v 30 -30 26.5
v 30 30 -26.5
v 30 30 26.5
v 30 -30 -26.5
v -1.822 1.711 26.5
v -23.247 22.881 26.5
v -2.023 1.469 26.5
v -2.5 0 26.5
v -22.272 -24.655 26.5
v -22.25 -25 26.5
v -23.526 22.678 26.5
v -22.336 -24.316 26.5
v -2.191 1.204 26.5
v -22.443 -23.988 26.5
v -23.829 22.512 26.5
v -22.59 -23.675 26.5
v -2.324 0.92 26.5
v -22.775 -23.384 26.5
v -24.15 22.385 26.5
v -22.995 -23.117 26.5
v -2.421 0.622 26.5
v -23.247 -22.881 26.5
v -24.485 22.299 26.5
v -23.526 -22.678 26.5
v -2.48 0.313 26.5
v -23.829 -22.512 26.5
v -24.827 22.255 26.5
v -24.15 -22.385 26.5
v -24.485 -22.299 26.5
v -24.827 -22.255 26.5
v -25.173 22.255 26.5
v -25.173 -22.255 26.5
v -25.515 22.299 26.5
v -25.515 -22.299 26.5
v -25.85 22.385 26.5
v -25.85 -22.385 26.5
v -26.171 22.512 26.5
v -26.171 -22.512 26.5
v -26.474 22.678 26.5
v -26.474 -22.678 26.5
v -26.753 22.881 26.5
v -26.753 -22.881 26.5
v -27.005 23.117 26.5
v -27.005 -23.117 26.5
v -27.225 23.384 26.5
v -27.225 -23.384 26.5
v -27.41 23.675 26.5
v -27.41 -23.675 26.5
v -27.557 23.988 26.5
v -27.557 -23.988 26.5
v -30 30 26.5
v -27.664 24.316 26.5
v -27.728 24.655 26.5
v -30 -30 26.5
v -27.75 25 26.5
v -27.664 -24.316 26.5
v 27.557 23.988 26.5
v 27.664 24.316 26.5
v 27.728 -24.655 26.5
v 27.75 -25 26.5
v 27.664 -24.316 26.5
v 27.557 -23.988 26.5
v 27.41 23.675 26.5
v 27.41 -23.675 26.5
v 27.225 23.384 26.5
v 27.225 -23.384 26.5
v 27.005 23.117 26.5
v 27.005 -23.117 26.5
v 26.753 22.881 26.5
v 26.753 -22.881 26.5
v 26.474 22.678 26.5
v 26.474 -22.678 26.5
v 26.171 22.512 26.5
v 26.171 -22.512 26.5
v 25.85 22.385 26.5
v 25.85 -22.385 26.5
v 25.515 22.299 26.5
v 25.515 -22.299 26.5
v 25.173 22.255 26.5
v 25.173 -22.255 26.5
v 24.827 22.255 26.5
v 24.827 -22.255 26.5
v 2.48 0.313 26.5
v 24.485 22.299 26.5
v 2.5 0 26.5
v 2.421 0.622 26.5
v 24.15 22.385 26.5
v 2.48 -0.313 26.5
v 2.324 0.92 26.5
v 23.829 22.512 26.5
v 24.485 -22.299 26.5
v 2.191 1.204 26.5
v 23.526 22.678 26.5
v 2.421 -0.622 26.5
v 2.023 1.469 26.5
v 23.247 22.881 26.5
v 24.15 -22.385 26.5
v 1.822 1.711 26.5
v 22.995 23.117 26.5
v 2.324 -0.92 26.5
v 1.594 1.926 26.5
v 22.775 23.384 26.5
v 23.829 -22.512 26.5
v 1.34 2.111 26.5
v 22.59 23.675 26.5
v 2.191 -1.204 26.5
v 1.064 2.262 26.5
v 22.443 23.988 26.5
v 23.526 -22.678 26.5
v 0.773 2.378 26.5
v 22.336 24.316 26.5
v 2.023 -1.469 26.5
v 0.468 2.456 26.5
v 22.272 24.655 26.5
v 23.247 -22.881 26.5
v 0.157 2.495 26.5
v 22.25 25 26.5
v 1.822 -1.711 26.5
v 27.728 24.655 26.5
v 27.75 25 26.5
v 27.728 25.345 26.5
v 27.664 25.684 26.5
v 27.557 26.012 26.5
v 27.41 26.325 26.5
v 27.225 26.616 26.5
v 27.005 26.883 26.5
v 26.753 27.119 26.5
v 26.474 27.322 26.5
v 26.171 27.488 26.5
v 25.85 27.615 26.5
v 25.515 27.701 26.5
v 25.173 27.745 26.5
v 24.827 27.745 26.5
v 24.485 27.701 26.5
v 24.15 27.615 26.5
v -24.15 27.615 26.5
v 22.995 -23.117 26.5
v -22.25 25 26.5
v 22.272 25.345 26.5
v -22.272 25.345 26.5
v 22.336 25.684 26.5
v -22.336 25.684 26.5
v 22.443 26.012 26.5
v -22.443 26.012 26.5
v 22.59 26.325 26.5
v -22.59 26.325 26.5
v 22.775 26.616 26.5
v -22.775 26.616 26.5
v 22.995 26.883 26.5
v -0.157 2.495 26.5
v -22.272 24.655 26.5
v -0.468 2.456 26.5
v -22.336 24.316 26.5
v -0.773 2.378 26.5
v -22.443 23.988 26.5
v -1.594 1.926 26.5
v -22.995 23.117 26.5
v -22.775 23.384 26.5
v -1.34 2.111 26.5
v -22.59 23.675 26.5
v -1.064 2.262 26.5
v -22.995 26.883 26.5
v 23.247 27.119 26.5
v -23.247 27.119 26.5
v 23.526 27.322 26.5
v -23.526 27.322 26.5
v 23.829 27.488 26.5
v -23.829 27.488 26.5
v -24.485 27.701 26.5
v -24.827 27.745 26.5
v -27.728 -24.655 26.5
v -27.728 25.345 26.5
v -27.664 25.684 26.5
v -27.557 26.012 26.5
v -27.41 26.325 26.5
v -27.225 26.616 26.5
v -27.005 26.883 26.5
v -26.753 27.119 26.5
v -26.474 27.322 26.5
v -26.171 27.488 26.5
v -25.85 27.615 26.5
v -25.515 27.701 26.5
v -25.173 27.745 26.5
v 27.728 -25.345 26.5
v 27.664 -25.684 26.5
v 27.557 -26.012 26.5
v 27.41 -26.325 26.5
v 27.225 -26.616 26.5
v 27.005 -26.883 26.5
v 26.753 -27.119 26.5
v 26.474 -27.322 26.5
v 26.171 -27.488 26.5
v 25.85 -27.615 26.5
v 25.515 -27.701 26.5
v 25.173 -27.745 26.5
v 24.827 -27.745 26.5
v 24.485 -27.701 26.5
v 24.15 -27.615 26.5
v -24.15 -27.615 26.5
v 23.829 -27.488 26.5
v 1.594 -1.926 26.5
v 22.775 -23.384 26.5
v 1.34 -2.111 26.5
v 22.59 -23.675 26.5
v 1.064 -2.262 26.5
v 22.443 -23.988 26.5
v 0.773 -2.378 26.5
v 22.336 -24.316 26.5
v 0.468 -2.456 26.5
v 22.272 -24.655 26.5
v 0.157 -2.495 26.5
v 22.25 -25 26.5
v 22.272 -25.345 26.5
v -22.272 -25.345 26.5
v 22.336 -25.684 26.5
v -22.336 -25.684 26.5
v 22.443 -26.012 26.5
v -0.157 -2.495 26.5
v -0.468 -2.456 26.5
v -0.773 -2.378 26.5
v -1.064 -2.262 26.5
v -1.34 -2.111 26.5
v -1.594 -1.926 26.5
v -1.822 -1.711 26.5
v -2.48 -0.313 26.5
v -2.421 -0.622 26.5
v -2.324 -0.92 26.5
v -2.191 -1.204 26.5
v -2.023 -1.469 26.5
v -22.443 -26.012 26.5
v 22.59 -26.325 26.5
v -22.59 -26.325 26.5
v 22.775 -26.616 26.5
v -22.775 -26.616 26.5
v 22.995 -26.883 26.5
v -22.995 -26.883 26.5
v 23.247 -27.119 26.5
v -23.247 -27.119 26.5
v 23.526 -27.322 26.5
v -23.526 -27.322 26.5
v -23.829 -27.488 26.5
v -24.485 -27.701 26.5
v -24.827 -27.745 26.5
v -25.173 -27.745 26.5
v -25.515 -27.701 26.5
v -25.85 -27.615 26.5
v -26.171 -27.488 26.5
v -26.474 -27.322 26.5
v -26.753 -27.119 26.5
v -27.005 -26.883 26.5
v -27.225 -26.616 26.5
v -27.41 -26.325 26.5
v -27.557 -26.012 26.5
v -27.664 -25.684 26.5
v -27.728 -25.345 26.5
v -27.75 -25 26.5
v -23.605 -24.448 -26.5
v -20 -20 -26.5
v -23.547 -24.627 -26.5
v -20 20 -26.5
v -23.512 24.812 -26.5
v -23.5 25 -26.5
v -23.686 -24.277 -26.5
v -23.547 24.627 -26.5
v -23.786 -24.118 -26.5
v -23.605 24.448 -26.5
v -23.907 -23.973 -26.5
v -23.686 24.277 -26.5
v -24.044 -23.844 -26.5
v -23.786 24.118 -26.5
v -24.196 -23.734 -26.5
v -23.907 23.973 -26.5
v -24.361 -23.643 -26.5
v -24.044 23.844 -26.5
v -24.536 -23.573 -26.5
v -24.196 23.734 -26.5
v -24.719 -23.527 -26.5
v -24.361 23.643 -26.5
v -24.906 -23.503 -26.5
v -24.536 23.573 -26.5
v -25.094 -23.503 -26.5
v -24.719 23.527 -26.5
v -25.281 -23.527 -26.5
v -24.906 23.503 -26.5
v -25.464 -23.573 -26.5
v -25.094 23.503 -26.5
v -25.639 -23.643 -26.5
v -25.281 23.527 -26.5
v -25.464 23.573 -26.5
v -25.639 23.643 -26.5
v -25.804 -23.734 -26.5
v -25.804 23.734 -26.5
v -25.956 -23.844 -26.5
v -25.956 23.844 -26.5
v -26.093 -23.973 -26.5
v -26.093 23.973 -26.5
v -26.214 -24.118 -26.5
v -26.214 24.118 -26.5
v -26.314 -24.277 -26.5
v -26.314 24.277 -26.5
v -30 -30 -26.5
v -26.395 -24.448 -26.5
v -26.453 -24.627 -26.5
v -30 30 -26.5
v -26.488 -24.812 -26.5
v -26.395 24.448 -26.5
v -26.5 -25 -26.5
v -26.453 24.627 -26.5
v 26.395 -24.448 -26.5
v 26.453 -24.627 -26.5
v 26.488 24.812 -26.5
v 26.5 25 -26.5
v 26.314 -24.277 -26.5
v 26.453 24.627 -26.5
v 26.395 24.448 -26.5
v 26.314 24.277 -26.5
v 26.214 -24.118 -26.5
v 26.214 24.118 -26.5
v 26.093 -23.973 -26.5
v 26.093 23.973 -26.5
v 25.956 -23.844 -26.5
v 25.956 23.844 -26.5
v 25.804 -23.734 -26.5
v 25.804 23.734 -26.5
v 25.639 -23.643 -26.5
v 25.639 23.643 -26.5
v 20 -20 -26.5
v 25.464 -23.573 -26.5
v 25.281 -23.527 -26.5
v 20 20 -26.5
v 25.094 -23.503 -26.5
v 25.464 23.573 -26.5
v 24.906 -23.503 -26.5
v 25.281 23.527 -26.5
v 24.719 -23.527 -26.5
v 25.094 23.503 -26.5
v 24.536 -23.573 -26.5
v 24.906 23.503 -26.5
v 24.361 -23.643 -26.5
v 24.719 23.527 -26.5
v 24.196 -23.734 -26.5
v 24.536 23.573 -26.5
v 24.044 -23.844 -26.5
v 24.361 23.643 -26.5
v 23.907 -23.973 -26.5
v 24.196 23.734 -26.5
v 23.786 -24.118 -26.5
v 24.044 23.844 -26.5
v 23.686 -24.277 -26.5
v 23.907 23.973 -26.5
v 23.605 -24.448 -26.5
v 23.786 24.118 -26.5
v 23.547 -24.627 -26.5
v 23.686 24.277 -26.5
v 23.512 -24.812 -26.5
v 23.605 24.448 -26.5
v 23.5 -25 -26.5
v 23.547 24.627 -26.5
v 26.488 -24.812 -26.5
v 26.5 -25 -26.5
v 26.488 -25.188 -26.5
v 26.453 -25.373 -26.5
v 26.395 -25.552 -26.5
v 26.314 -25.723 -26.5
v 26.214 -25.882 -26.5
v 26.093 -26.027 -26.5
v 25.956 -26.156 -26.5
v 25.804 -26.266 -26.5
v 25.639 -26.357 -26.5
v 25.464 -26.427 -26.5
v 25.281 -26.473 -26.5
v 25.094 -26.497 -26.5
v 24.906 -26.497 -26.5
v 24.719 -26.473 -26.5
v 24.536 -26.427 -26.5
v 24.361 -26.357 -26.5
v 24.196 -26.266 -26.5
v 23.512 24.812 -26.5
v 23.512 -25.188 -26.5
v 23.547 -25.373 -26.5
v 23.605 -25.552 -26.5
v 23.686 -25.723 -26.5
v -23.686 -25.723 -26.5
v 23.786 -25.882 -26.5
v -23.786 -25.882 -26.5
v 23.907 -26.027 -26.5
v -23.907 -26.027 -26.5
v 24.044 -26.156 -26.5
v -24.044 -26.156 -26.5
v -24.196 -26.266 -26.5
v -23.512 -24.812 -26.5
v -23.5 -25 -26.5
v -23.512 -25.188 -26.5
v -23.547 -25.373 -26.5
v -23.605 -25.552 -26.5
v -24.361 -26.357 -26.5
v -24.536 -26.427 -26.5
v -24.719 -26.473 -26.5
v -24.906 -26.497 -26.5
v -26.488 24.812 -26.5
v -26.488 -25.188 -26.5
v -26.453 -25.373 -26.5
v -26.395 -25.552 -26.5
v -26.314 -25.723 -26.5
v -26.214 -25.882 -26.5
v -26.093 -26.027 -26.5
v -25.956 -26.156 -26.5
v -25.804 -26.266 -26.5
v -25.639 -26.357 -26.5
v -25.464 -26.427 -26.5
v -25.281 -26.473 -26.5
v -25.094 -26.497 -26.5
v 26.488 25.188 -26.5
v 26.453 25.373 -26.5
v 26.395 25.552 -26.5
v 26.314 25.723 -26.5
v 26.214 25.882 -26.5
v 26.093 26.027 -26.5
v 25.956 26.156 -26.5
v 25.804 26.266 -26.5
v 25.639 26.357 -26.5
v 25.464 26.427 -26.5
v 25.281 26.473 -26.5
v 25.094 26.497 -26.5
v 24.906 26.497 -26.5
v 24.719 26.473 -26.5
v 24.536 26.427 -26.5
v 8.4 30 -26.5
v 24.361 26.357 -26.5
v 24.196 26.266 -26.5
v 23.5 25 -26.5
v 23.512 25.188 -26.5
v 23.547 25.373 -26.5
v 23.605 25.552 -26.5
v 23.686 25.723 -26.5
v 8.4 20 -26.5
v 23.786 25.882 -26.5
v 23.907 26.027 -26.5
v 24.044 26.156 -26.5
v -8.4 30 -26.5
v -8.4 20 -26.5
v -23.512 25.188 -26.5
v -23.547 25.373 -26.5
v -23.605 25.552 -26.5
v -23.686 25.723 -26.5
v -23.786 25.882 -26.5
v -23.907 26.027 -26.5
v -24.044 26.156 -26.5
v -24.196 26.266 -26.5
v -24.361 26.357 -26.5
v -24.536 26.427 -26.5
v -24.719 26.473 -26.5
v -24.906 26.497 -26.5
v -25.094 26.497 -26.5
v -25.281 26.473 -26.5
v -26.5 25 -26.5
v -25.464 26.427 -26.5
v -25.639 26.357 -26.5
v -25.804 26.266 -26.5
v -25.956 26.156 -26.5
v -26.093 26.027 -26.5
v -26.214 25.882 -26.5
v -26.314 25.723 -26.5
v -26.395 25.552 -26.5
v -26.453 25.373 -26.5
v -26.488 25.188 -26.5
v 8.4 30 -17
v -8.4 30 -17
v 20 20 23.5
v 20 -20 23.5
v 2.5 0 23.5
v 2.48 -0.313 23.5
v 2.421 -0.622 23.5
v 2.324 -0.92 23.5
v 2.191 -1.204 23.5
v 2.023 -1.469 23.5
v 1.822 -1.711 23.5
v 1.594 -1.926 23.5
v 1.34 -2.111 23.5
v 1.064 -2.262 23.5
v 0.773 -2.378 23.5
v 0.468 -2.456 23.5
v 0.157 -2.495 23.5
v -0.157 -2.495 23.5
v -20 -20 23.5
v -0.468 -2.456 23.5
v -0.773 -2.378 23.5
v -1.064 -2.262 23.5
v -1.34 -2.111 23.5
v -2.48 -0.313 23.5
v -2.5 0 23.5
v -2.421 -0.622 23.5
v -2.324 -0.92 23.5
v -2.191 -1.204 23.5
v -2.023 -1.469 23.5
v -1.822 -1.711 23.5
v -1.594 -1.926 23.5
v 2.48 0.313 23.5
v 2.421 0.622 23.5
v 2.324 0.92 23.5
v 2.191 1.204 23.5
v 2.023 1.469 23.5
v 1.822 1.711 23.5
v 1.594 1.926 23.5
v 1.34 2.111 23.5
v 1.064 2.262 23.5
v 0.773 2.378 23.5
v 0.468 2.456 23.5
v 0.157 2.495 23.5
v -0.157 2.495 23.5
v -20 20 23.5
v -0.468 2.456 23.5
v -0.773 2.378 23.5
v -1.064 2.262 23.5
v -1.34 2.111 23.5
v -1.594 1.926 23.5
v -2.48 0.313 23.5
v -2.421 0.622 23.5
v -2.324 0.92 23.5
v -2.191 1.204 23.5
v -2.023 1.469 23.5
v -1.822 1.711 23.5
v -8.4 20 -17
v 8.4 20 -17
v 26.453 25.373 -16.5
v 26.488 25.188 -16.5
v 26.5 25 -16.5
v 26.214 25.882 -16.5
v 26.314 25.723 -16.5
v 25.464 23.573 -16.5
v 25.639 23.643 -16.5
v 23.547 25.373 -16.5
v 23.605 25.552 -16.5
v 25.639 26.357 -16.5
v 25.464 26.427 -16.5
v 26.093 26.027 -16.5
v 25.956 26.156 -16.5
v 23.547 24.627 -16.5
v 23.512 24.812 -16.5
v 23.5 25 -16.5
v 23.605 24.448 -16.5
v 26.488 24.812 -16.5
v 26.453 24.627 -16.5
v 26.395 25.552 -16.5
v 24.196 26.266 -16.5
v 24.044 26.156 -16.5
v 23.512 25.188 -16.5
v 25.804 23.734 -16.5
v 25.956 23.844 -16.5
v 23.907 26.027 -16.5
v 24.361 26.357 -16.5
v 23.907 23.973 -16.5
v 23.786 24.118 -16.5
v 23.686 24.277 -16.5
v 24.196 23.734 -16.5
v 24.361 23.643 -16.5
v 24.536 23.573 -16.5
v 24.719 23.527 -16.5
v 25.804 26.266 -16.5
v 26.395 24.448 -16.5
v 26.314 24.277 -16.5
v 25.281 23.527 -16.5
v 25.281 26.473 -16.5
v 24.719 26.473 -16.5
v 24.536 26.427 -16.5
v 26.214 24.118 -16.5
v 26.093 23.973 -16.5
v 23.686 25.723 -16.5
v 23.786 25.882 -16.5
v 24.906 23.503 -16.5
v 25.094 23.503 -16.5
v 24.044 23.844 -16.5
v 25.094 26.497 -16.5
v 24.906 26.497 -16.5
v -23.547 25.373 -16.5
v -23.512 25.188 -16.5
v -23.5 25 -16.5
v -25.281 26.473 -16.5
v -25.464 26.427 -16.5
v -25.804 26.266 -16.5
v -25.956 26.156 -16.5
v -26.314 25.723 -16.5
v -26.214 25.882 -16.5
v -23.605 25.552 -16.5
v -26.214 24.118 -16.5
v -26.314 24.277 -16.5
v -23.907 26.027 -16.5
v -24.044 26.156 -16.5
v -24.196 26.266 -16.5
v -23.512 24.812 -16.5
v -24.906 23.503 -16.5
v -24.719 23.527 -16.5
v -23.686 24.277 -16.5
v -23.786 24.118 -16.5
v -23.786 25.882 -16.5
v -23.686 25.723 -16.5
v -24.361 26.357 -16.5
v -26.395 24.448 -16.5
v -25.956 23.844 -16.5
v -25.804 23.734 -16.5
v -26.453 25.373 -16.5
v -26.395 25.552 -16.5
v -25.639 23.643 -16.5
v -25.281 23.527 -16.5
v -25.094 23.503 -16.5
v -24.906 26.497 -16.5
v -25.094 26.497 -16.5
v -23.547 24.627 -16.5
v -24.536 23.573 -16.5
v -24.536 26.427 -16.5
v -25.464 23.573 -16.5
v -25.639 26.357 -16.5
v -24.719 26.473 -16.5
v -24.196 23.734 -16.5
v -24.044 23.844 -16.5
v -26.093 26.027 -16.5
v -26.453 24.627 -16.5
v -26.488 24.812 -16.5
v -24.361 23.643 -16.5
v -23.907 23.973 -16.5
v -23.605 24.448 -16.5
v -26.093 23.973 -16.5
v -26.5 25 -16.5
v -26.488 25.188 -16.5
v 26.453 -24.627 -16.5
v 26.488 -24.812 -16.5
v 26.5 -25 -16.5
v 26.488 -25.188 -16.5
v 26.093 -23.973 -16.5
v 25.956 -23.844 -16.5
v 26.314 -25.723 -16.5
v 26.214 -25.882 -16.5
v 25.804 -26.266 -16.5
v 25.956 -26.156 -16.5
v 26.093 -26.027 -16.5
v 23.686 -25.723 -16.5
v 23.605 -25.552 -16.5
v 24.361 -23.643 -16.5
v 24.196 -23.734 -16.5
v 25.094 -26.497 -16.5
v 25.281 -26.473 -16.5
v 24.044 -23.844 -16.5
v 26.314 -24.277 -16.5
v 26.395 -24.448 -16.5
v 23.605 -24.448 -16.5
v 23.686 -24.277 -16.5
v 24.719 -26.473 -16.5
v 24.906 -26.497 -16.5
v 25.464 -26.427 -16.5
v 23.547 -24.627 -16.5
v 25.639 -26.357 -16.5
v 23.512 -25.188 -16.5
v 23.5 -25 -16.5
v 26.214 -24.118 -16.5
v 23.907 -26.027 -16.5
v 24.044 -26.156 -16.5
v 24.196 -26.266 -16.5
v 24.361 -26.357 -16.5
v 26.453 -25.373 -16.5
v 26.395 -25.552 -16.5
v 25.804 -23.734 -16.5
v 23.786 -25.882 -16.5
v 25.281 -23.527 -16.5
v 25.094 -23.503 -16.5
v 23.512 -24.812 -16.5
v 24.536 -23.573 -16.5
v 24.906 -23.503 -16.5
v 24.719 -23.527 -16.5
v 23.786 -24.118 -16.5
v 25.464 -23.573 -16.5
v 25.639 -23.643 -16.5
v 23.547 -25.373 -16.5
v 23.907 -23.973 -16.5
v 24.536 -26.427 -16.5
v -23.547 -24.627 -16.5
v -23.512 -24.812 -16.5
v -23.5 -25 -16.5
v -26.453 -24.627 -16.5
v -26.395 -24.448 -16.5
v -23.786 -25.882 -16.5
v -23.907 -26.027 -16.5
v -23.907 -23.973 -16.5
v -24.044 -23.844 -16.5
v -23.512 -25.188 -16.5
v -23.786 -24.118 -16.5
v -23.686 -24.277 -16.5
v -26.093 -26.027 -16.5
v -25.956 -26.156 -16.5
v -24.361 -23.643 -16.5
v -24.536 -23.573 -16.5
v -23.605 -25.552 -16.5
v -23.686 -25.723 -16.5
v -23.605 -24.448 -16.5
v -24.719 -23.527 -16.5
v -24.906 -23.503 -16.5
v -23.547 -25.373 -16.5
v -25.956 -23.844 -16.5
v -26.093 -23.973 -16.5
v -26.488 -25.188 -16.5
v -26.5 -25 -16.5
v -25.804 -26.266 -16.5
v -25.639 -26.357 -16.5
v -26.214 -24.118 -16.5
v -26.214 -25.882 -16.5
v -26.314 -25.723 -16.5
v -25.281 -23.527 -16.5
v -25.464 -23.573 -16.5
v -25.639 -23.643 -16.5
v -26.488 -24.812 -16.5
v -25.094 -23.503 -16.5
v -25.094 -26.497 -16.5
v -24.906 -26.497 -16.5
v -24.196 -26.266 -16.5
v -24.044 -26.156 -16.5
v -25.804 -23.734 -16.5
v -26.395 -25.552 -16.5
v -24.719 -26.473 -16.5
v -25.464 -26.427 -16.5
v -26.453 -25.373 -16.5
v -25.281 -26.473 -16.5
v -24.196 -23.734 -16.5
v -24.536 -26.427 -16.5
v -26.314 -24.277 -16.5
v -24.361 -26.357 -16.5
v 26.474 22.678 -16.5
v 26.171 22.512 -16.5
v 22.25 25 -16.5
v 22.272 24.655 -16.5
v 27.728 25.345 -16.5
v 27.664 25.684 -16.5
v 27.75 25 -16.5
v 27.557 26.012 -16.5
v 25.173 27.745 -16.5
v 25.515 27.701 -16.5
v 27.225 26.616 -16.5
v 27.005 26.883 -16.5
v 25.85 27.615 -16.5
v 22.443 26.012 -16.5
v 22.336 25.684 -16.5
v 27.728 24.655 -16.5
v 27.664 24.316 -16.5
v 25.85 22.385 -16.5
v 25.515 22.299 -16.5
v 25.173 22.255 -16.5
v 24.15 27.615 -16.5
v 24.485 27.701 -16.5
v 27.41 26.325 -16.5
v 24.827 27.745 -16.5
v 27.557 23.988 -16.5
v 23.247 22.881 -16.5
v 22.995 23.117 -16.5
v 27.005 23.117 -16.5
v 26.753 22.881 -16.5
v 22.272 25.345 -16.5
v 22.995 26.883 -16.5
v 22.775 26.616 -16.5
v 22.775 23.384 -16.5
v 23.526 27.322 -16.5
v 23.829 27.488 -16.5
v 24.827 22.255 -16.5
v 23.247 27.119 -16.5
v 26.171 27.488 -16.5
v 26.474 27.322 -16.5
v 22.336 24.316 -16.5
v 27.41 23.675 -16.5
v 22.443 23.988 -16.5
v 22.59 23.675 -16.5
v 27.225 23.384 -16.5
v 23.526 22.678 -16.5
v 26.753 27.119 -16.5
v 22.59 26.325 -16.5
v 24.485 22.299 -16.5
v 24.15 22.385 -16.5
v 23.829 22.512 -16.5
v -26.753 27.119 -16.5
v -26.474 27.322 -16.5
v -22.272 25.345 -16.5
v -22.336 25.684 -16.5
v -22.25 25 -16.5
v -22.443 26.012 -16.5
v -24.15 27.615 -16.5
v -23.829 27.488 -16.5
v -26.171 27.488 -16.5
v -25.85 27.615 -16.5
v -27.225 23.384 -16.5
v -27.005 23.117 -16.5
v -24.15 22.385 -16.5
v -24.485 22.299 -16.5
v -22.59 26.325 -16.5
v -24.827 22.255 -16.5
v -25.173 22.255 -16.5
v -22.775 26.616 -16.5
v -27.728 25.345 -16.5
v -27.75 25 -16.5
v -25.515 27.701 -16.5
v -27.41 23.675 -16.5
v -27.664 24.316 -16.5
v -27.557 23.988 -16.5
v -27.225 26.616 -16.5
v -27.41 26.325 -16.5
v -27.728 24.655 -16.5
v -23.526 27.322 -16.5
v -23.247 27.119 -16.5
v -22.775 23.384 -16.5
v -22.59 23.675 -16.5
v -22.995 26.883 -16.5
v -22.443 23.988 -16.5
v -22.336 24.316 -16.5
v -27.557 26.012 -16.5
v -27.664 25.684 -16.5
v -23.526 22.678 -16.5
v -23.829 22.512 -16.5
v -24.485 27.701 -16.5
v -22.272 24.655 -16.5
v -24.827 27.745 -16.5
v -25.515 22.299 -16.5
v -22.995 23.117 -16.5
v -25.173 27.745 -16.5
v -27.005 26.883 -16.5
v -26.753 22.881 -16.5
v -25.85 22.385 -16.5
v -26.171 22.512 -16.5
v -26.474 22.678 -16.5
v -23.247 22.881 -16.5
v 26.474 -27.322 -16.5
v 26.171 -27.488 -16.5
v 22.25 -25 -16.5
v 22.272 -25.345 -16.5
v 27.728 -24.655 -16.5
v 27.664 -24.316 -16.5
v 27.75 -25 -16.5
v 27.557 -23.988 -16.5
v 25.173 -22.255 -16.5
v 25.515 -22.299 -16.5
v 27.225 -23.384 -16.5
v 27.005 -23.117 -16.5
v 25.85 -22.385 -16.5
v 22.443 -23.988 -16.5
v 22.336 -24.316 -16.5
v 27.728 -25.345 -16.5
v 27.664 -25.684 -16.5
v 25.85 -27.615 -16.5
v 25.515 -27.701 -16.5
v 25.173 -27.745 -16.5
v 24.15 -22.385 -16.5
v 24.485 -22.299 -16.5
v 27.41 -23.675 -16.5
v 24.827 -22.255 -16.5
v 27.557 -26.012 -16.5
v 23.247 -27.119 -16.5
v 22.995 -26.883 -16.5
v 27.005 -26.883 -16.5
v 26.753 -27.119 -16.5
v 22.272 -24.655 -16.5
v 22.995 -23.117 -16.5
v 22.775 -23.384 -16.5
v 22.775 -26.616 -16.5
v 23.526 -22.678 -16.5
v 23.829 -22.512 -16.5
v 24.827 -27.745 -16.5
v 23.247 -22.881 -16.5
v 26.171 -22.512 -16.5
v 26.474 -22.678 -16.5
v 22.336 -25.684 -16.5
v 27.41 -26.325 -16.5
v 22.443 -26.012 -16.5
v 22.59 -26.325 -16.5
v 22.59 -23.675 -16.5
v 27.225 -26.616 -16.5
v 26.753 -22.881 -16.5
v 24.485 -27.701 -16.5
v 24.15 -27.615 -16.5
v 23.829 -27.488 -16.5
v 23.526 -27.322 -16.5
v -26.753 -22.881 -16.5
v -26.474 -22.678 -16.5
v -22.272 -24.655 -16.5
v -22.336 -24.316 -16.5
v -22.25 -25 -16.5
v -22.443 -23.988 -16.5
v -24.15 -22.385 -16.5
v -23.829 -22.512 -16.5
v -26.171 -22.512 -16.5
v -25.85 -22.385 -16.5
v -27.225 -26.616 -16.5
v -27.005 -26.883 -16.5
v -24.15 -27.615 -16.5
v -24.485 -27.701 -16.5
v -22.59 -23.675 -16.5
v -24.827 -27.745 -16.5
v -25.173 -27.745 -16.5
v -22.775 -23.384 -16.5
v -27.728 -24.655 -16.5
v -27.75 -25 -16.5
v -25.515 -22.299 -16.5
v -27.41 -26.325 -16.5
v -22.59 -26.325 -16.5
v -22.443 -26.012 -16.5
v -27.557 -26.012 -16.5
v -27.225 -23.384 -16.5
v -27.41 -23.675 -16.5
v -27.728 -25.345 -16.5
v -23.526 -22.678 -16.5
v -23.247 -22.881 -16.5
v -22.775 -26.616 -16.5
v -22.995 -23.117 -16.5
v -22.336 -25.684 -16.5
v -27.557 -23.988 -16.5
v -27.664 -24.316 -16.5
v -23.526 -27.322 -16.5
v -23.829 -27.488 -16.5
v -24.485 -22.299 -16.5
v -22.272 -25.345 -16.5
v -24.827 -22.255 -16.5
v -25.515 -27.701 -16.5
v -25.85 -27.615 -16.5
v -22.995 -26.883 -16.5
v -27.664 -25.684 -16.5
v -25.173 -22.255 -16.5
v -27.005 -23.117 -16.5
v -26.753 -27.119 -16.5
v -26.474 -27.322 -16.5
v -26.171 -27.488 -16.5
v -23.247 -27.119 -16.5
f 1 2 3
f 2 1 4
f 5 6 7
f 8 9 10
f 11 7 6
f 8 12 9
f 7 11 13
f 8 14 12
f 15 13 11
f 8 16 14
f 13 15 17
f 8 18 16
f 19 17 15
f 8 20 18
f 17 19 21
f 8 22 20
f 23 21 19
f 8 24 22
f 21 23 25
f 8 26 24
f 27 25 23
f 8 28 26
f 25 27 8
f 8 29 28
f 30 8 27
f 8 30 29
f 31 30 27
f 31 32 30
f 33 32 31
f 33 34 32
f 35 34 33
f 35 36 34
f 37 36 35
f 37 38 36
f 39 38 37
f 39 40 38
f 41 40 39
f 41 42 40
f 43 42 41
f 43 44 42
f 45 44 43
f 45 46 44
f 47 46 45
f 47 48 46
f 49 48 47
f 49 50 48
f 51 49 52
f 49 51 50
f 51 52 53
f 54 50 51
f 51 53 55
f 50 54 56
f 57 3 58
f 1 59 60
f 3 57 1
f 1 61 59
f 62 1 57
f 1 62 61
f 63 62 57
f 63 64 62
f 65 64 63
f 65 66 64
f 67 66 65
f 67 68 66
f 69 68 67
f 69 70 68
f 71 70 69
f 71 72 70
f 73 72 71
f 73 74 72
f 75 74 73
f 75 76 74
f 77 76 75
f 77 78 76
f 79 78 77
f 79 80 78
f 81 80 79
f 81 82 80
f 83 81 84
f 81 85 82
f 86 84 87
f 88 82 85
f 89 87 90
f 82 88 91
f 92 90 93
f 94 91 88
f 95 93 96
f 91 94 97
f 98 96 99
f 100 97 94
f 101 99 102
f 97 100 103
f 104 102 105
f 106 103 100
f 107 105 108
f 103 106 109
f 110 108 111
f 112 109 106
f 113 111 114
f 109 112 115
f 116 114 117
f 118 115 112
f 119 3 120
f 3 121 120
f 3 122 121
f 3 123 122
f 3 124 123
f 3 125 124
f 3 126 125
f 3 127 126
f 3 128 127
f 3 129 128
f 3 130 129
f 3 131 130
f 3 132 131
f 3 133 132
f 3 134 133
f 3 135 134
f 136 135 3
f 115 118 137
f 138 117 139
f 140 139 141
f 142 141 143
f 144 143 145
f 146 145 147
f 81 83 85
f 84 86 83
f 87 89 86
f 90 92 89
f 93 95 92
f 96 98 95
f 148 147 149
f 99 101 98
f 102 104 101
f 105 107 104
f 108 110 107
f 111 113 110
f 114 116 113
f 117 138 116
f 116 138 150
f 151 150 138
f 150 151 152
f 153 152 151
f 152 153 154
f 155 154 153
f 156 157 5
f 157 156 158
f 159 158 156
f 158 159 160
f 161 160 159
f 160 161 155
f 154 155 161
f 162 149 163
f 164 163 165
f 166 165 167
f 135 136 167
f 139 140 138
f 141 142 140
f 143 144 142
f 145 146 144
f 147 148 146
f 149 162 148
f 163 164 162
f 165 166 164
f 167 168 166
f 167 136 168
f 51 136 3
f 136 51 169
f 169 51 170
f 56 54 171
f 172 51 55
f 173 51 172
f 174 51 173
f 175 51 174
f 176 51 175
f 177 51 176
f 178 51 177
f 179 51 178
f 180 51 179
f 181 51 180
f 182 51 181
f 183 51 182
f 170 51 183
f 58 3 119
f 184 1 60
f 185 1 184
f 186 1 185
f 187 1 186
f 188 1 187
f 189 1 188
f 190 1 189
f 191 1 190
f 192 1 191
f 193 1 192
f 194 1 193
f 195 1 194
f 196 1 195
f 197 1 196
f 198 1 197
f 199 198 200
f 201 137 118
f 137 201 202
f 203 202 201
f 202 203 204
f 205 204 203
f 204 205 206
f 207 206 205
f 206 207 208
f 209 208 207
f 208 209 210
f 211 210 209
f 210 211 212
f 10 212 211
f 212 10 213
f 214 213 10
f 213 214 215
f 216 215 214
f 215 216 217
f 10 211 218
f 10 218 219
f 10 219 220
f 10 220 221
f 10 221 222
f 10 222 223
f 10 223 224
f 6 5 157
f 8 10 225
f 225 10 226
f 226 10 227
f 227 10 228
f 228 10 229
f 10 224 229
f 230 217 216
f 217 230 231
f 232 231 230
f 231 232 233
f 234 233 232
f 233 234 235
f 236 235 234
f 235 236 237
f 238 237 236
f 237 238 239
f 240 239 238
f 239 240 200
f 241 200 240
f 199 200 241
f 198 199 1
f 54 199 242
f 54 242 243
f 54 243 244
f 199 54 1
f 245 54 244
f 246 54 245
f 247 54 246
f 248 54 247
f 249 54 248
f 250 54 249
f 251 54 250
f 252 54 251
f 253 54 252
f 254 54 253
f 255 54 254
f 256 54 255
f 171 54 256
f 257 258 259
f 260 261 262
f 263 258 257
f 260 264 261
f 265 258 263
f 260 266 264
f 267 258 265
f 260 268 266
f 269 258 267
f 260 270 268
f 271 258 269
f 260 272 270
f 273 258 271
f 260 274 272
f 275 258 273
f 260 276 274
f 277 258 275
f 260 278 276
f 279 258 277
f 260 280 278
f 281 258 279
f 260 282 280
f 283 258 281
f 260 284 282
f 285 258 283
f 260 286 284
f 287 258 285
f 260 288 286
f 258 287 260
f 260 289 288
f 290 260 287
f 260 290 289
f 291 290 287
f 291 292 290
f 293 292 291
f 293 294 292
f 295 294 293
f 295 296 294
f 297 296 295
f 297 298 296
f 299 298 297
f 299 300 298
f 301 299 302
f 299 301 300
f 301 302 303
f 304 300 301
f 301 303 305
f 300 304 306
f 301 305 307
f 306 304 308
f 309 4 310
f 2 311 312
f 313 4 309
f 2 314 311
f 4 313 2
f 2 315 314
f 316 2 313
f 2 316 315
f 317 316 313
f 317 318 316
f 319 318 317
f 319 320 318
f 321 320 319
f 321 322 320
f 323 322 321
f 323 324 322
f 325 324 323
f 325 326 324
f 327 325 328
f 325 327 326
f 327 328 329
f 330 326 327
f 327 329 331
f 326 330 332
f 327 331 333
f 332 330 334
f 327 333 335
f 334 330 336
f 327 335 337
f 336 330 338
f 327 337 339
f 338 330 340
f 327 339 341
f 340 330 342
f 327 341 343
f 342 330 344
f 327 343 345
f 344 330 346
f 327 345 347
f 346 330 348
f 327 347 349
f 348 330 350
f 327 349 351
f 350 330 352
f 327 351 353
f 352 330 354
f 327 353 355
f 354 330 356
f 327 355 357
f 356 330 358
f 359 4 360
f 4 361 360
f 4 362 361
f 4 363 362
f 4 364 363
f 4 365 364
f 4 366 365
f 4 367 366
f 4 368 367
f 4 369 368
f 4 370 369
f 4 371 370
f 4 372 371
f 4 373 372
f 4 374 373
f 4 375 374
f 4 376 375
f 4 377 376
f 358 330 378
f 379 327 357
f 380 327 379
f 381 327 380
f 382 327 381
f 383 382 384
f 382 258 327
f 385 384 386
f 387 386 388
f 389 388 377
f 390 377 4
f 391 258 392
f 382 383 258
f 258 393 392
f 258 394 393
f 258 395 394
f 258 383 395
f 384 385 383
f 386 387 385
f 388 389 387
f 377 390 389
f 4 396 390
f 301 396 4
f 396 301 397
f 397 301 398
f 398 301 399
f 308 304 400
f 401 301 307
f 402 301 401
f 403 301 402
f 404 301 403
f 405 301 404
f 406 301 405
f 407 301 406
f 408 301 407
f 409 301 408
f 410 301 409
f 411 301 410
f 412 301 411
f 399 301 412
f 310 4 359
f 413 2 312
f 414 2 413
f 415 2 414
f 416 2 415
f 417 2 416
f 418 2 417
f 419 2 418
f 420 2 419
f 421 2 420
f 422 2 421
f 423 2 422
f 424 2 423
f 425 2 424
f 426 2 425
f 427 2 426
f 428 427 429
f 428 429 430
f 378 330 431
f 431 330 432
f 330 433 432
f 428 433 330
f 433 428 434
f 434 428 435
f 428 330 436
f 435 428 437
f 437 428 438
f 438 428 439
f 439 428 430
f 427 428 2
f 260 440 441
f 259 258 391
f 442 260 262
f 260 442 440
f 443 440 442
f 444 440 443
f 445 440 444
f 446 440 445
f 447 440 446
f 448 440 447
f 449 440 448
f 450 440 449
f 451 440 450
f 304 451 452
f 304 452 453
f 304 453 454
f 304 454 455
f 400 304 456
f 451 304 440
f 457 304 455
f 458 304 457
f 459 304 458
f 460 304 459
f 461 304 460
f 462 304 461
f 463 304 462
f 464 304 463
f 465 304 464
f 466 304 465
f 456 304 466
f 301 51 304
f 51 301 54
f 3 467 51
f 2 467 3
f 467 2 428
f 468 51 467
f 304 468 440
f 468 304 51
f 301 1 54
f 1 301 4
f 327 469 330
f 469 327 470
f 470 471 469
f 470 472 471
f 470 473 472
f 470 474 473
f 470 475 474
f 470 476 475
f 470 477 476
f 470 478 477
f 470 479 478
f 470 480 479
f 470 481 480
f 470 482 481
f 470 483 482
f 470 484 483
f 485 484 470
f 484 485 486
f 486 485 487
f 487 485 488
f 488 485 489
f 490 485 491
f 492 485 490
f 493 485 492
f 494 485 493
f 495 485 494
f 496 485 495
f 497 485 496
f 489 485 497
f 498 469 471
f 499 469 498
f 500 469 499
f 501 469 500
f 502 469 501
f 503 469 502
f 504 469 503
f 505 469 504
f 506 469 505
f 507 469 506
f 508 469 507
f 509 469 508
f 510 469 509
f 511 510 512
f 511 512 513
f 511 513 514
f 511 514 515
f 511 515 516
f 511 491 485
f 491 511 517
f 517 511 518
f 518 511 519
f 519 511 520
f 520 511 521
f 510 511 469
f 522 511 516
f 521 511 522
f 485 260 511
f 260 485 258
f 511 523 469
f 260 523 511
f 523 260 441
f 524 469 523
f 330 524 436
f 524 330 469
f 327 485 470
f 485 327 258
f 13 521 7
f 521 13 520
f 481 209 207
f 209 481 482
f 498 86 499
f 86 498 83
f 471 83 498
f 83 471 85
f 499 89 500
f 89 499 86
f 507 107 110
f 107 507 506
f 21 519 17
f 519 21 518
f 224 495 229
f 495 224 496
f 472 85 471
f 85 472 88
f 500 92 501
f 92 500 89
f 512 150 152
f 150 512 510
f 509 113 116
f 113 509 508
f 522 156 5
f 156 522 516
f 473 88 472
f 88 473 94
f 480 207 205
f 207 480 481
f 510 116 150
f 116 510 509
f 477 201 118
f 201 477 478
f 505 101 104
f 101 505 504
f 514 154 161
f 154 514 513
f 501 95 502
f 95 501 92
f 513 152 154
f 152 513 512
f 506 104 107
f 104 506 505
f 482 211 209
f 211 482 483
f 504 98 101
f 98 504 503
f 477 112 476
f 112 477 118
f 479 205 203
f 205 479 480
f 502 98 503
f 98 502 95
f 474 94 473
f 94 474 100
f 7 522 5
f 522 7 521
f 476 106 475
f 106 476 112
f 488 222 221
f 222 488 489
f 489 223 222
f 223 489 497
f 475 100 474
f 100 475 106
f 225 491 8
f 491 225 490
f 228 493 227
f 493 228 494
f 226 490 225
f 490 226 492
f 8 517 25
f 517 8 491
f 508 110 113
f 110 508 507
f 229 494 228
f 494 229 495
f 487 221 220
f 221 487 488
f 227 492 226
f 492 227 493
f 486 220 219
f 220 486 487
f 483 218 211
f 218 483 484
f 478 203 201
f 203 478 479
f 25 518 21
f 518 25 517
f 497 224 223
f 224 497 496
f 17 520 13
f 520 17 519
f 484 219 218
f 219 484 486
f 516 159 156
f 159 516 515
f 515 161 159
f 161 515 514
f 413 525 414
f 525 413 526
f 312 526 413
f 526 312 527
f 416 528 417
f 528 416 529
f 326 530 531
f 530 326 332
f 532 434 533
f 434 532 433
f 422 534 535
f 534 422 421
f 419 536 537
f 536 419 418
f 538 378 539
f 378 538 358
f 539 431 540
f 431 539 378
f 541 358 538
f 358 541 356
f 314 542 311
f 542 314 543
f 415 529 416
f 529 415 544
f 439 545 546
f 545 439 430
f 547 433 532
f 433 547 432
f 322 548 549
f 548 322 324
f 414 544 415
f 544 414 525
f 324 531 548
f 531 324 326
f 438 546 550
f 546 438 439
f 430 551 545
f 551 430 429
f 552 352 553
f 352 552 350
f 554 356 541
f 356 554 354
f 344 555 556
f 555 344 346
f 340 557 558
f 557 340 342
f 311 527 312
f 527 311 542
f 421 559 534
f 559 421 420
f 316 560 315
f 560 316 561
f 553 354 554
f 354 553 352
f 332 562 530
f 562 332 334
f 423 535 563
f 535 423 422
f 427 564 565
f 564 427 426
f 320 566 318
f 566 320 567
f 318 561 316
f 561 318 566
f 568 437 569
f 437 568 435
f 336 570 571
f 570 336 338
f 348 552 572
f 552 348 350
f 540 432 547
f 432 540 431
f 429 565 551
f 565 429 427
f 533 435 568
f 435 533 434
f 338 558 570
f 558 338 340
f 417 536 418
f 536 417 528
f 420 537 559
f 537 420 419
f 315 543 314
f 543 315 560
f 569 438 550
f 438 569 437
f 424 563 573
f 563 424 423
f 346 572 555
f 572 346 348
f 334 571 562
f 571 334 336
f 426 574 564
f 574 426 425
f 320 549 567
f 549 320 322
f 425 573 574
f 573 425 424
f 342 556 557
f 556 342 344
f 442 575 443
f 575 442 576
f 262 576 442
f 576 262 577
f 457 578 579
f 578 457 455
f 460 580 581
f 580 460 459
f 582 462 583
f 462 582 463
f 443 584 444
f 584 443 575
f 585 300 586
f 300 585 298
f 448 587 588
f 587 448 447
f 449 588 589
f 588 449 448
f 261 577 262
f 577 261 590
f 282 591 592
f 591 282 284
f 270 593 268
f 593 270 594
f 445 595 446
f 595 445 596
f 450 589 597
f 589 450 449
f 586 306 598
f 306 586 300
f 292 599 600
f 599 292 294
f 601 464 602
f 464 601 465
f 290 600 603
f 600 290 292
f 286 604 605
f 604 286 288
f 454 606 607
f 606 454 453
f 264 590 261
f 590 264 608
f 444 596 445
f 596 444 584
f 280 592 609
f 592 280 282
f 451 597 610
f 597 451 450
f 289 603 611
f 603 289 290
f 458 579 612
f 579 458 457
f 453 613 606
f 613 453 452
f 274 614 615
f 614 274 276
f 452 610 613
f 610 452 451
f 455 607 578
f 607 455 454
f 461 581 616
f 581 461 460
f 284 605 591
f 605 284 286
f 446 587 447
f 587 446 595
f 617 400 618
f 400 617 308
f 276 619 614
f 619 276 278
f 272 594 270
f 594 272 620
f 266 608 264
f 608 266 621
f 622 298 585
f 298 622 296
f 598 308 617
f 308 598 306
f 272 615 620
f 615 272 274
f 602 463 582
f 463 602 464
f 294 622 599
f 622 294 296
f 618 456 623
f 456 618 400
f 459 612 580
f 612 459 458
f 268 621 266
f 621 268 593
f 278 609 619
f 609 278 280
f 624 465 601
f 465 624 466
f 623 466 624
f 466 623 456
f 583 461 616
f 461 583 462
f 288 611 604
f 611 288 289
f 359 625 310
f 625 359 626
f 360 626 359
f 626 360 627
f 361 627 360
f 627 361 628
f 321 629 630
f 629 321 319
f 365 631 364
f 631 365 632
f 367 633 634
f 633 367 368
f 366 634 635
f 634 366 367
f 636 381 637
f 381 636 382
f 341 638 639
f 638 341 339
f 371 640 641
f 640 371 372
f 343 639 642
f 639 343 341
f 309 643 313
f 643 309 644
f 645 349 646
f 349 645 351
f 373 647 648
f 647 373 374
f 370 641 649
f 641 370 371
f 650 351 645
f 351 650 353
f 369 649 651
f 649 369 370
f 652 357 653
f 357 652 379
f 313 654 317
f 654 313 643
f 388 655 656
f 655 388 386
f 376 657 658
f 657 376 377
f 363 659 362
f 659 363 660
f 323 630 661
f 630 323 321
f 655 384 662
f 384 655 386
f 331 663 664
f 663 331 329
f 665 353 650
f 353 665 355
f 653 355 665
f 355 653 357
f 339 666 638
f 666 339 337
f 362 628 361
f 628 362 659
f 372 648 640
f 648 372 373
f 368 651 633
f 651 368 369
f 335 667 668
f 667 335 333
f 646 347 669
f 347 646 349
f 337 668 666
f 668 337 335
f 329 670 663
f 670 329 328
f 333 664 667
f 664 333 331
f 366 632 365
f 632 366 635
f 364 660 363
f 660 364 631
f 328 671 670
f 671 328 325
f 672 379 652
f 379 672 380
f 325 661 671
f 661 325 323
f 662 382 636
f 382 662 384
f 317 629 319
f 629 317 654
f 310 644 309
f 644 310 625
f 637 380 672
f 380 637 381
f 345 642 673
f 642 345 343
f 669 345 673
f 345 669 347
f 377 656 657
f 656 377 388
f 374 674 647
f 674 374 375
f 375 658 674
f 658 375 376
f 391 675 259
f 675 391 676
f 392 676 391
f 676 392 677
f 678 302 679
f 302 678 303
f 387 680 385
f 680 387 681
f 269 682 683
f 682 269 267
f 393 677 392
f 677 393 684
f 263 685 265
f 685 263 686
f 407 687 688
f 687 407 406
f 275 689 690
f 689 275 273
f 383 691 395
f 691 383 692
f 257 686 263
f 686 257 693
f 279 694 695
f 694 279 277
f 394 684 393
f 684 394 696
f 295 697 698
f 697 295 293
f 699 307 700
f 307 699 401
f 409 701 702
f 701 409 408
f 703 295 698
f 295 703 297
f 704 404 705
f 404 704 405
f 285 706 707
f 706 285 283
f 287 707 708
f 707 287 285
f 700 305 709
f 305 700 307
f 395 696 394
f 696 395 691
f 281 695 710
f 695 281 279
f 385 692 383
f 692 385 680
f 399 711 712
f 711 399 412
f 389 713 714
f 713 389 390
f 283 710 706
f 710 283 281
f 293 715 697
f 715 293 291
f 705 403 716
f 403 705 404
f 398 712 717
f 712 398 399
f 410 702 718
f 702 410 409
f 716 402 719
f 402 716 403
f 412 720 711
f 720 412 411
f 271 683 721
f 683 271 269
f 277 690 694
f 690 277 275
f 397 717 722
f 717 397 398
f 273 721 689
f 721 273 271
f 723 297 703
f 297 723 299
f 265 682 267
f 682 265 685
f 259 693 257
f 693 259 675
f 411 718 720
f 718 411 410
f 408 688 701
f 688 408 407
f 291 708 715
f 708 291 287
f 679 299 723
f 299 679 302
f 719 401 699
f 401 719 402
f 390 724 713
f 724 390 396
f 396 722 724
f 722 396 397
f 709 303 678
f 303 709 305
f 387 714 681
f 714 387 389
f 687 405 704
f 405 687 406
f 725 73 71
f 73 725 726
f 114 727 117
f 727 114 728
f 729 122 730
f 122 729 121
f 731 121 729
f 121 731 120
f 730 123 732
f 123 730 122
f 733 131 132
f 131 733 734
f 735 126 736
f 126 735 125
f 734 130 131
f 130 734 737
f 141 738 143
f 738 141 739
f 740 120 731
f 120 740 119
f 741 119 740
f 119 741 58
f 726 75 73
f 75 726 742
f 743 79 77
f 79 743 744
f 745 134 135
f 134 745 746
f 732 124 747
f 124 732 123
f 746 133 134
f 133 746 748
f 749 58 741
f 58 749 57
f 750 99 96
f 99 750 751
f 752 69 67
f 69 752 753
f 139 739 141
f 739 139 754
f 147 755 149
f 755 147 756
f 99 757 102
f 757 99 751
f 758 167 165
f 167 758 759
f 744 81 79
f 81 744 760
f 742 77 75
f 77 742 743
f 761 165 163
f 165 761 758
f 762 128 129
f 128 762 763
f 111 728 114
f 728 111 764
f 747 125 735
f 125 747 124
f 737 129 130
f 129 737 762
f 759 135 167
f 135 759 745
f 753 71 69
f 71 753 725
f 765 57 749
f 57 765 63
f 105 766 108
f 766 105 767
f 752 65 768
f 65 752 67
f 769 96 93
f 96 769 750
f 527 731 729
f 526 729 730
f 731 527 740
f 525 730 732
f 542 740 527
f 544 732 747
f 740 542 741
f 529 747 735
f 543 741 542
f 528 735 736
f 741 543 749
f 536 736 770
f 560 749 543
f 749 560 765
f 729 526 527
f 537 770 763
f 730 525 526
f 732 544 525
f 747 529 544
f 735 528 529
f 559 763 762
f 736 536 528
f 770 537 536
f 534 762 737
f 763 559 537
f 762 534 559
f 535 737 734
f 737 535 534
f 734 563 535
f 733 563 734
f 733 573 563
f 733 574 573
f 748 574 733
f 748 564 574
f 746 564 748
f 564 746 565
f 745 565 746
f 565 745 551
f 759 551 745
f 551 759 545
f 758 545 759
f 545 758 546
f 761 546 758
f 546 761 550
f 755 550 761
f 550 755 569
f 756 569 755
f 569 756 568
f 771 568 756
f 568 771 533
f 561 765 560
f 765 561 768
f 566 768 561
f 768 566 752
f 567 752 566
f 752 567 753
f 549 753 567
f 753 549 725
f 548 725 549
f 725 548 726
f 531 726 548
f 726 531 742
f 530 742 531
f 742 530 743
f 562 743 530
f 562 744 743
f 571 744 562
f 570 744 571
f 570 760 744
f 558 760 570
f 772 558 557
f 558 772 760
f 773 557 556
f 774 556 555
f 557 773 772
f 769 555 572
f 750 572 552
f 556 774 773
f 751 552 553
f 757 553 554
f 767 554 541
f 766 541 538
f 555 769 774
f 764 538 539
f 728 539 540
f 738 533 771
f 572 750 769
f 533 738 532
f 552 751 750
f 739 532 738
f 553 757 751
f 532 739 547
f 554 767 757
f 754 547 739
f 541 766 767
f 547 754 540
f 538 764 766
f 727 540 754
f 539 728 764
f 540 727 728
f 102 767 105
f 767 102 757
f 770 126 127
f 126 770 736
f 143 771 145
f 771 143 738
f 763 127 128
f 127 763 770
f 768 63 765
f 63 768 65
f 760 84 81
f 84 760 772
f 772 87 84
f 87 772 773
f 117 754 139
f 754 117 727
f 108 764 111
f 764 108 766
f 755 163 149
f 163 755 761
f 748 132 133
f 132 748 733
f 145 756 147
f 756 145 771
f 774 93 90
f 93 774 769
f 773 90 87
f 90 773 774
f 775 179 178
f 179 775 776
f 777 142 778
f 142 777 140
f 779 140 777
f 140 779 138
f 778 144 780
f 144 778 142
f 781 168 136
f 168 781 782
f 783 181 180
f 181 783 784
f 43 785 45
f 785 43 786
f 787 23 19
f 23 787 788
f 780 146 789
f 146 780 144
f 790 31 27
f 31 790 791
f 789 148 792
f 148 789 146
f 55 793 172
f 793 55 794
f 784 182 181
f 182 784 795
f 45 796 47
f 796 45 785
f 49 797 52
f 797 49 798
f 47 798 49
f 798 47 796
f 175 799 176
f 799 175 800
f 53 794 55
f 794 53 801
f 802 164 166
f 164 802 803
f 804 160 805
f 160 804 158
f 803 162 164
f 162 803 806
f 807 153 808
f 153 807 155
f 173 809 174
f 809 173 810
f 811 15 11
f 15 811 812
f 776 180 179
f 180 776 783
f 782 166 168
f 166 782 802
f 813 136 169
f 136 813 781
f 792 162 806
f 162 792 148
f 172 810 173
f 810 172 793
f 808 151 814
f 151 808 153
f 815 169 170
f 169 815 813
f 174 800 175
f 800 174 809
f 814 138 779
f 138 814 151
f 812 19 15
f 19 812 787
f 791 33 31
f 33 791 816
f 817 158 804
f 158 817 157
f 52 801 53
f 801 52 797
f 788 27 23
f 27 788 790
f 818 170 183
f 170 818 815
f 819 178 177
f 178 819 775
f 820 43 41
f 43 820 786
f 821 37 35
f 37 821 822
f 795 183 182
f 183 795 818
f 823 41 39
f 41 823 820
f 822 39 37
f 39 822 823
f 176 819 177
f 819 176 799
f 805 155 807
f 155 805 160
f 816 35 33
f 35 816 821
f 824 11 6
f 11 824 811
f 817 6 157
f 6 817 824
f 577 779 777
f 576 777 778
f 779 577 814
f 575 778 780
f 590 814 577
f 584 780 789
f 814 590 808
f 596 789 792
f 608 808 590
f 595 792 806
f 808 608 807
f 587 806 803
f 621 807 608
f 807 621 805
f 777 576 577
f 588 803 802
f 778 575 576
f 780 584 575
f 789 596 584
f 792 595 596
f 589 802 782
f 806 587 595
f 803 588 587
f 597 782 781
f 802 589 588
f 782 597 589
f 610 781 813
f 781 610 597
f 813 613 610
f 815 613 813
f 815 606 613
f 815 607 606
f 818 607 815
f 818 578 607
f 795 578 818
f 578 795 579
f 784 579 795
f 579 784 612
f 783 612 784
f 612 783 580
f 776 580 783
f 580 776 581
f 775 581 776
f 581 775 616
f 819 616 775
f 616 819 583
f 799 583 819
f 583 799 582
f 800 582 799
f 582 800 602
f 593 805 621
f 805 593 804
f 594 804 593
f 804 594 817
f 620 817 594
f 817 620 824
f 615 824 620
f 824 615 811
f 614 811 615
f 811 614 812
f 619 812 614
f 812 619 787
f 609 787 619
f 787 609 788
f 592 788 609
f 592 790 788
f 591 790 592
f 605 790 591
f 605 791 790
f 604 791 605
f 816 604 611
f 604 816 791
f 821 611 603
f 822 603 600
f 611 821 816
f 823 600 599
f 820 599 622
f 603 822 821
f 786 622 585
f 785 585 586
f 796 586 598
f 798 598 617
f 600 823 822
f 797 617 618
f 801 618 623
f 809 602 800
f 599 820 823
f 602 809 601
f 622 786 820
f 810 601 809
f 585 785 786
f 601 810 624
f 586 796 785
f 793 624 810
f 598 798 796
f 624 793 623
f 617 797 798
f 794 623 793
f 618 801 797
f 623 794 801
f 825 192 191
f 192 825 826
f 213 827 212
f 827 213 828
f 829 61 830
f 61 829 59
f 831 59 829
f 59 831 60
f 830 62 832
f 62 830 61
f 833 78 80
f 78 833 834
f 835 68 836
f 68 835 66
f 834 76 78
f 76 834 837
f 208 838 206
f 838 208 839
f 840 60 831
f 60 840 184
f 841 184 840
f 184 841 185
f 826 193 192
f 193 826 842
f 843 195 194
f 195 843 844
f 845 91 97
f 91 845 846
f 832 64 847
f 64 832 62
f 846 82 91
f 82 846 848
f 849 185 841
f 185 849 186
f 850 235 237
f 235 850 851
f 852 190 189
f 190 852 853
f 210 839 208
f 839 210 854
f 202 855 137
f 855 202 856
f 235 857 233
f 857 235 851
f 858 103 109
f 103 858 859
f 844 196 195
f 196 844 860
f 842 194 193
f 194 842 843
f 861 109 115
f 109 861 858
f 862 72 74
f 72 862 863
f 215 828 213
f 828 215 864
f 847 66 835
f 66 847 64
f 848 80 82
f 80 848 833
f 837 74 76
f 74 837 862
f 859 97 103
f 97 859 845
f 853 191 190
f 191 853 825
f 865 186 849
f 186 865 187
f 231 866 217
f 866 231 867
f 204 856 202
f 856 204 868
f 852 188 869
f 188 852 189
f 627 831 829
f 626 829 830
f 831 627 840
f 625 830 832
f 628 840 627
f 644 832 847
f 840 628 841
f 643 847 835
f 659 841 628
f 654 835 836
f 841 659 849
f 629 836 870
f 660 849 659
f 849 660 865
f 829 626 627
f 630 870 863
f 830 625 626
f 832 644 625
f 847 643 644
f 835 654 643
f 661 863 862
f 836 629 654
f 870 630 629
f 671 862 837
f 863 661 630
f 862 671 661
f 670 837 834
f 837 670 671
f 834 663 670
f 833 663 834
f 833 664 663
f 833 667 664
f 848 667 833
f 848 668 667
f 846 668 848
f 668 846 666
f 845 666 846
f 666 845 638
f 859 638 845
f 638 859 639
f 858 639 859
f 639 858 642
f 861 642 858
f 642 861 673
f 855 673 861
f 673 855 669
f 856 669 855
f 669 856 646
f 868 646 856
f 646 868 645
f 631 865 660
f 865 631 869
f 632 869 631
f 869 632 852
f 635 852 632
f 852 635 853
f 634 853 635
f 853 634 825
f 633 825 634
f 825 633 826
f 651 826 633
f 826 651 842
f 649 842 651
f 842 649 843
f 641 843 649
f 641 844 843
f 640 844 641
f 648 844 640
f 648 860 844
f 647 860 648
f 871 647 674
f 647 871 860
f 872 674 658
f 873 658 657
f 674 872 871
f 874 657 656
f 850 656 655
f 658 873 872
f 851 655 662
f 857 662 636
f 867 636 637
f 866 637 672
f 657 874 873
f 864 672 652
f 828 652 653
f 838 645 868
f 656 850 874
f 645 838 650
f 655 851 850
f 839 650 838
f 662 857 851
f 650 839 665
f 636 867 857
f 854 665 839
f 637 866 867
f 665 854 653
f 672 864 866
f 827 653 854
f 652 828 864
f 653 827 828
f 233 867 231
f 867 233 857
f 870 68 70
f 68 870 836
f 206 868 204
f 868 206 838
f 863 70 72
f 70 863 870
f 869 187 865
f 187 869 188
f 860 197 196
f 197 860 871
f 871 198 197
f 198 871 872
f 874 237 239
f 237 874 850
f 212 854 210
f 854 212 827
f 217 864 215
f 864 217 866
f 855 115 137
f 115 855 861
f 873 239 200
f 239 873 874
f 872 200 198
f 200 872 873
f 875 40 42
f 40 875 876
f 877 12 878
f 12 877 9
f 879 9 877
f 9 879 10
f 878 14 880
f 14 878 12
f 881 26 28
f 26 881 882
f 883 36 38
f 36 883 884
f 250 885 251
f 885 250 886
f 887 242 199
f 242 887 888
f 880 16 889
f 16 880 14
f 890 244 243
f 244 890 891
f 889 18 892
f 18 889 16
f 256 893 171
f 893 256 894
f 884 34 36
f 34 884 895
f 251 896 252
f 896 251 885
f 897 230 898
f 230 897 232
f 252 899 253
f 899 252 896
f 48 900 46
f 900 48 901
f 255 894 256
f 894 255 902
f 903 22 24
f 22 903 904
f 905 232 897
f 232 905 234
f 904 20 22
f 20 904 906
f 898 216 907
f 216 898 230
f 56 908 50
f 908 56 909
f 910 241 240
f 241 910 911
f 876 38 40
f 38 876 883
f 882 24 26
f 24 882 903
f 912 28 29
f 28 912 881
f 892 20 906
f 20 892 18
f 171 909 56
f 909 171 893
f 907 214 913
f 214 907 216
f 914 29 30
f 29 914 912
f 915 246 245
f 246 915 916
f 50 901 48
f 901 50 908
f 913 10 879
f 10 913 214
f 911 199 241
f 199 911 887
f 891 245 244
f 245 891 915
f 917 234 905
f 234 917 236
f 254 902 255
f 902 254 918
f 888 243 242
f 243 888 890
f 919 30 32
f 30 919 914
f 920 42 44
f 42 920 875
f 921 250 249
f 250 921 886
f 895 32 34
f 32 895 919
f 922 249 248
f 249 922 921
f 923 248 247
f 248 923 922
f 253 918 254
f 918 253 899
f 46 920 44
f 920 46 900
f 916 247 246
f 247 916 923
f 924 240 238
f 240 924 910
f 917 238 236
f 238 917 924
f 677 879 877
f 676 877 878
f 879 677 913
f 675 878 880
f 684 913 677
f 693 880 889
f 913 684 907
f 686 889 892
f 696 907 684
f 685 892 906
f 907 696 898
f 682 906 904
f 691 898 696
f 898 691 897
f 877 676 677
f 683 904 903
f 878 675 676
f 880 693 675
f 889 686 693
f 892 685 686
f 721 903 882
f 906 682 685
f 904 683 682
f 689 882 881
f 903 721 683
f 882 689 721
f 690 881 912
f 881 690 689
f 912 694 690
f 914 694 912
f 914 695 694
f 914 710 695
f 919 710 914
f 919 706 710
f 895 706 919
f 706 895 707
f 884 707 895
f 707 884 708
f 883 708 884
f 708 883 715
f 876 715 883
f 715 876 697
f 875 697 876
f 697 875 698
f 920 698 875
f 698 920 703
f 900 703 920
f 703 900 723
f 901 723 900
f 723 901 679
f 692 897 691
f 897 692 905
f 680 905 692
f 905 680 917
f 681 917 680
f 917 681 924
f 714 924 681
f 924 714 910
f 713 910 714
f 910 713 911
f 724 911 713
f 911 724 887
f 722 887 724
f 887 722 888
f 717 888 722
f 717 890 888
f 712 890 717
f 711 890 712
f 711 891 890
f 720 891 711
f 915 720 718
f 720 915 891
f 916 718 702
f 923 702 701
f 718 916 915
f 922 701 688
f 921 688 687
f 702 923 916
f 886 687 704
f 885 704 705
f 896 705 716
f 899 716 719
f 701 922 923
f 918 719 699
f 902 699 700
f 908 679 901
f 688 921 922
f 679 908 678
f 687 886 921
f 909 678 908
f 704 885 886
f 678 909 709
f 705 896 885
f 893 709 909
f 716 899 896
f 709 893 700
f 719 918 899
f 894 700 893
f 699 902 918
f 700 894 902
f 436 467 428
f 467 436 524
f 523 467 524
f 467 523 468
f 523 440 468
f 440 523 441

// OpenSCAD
Height=50; //
X=40; //
Y=40; //
Borediameter=5;
Nutdiameter=3;
Nutscrewdiameter=5.5;
difference() {
        
    cube([60,60,Height+3],center=true);
    translate([0,0,-3])
    cube([X,Y,Height+3],center=true);
    translate([0,0,0])
    cylinder(h=(Height+3)/2,r1=Borediameter/2,r2=Borediameter/2,$fn=50);
    translate([(((60-X)/4)+(X/2)),(((60-Y)/4)+(Y/2)),-((Height+3)/2)])
    cylinder(h=Height+3,r1=Nutdiameter/2,r2=Nutdiameter/2,$fn=50);
    translate([-(((60-X)/4)+(X/2)),(((60-Y)/4)+(Y/2)),-((Height+3)/2)])
    cylinder(h=Height+3,r1=Nutdiameter/2,r2=Nutdiameter/2,$fn=50);
    translate([(((60-X)/4)+(X/2)),-(((60-Y)/4)+(Y/2)),-((Height+3)/2)])
    cylinder(h=Height+3,r1=Nutdiameter/2,r2=Nutdiameter/2,$fn=50);
    translate([-(((60-X)/4)+(X/2)),-(((60-Y)/4)+(Y/2)),-((Height+3)/2)])
    cylinder(h=Height+3,r1=Nutdiameter/2,r2=Nutdiameter/2,$fn=50);
    
    
    translate([(((60-X)/4)+(X/2)),(((60-Y)/4)+(Y/2)),-((Height+3)/2)+10])
    cylinder(h=Height+3,r1=Nutscrewdiameter/2,r2=Nutscrewdiameter/2,$fn=50);
    translate([-(((60-X)/4)+(X/2)),(((60-Y)/4)+(Y/2)),-((Height+3)/2)+10])
    cylinder(h=Height+3,r1=Nutscrewdiameter/2,r2=Nutscrewdiameter/2,$fn=50);
    translate([(((60-X)/4)+(X/2)),-(((60-Y)/4)+(Y/2)),-((Height+3)/2)+10])
    cylinder(h=Height+3,r1=Nutscrewdiameter/2,r2=Nutscrewdiameter/2,$fn=50);
    translate([-(((60-X)/4)+(X/2)),-(((60-Y)/4)+(Y/2)),-((Height+3)/2)+10])
    cylinder(h=Height+3,r1=Nutscrewdiameter/2,r2=Nutscrewdiameter/2,$fn=50);
    
    translate([-8.4,20,-((Height+3)/2)])
scale([1,1,0.56547])
    cube(16.8);
}
